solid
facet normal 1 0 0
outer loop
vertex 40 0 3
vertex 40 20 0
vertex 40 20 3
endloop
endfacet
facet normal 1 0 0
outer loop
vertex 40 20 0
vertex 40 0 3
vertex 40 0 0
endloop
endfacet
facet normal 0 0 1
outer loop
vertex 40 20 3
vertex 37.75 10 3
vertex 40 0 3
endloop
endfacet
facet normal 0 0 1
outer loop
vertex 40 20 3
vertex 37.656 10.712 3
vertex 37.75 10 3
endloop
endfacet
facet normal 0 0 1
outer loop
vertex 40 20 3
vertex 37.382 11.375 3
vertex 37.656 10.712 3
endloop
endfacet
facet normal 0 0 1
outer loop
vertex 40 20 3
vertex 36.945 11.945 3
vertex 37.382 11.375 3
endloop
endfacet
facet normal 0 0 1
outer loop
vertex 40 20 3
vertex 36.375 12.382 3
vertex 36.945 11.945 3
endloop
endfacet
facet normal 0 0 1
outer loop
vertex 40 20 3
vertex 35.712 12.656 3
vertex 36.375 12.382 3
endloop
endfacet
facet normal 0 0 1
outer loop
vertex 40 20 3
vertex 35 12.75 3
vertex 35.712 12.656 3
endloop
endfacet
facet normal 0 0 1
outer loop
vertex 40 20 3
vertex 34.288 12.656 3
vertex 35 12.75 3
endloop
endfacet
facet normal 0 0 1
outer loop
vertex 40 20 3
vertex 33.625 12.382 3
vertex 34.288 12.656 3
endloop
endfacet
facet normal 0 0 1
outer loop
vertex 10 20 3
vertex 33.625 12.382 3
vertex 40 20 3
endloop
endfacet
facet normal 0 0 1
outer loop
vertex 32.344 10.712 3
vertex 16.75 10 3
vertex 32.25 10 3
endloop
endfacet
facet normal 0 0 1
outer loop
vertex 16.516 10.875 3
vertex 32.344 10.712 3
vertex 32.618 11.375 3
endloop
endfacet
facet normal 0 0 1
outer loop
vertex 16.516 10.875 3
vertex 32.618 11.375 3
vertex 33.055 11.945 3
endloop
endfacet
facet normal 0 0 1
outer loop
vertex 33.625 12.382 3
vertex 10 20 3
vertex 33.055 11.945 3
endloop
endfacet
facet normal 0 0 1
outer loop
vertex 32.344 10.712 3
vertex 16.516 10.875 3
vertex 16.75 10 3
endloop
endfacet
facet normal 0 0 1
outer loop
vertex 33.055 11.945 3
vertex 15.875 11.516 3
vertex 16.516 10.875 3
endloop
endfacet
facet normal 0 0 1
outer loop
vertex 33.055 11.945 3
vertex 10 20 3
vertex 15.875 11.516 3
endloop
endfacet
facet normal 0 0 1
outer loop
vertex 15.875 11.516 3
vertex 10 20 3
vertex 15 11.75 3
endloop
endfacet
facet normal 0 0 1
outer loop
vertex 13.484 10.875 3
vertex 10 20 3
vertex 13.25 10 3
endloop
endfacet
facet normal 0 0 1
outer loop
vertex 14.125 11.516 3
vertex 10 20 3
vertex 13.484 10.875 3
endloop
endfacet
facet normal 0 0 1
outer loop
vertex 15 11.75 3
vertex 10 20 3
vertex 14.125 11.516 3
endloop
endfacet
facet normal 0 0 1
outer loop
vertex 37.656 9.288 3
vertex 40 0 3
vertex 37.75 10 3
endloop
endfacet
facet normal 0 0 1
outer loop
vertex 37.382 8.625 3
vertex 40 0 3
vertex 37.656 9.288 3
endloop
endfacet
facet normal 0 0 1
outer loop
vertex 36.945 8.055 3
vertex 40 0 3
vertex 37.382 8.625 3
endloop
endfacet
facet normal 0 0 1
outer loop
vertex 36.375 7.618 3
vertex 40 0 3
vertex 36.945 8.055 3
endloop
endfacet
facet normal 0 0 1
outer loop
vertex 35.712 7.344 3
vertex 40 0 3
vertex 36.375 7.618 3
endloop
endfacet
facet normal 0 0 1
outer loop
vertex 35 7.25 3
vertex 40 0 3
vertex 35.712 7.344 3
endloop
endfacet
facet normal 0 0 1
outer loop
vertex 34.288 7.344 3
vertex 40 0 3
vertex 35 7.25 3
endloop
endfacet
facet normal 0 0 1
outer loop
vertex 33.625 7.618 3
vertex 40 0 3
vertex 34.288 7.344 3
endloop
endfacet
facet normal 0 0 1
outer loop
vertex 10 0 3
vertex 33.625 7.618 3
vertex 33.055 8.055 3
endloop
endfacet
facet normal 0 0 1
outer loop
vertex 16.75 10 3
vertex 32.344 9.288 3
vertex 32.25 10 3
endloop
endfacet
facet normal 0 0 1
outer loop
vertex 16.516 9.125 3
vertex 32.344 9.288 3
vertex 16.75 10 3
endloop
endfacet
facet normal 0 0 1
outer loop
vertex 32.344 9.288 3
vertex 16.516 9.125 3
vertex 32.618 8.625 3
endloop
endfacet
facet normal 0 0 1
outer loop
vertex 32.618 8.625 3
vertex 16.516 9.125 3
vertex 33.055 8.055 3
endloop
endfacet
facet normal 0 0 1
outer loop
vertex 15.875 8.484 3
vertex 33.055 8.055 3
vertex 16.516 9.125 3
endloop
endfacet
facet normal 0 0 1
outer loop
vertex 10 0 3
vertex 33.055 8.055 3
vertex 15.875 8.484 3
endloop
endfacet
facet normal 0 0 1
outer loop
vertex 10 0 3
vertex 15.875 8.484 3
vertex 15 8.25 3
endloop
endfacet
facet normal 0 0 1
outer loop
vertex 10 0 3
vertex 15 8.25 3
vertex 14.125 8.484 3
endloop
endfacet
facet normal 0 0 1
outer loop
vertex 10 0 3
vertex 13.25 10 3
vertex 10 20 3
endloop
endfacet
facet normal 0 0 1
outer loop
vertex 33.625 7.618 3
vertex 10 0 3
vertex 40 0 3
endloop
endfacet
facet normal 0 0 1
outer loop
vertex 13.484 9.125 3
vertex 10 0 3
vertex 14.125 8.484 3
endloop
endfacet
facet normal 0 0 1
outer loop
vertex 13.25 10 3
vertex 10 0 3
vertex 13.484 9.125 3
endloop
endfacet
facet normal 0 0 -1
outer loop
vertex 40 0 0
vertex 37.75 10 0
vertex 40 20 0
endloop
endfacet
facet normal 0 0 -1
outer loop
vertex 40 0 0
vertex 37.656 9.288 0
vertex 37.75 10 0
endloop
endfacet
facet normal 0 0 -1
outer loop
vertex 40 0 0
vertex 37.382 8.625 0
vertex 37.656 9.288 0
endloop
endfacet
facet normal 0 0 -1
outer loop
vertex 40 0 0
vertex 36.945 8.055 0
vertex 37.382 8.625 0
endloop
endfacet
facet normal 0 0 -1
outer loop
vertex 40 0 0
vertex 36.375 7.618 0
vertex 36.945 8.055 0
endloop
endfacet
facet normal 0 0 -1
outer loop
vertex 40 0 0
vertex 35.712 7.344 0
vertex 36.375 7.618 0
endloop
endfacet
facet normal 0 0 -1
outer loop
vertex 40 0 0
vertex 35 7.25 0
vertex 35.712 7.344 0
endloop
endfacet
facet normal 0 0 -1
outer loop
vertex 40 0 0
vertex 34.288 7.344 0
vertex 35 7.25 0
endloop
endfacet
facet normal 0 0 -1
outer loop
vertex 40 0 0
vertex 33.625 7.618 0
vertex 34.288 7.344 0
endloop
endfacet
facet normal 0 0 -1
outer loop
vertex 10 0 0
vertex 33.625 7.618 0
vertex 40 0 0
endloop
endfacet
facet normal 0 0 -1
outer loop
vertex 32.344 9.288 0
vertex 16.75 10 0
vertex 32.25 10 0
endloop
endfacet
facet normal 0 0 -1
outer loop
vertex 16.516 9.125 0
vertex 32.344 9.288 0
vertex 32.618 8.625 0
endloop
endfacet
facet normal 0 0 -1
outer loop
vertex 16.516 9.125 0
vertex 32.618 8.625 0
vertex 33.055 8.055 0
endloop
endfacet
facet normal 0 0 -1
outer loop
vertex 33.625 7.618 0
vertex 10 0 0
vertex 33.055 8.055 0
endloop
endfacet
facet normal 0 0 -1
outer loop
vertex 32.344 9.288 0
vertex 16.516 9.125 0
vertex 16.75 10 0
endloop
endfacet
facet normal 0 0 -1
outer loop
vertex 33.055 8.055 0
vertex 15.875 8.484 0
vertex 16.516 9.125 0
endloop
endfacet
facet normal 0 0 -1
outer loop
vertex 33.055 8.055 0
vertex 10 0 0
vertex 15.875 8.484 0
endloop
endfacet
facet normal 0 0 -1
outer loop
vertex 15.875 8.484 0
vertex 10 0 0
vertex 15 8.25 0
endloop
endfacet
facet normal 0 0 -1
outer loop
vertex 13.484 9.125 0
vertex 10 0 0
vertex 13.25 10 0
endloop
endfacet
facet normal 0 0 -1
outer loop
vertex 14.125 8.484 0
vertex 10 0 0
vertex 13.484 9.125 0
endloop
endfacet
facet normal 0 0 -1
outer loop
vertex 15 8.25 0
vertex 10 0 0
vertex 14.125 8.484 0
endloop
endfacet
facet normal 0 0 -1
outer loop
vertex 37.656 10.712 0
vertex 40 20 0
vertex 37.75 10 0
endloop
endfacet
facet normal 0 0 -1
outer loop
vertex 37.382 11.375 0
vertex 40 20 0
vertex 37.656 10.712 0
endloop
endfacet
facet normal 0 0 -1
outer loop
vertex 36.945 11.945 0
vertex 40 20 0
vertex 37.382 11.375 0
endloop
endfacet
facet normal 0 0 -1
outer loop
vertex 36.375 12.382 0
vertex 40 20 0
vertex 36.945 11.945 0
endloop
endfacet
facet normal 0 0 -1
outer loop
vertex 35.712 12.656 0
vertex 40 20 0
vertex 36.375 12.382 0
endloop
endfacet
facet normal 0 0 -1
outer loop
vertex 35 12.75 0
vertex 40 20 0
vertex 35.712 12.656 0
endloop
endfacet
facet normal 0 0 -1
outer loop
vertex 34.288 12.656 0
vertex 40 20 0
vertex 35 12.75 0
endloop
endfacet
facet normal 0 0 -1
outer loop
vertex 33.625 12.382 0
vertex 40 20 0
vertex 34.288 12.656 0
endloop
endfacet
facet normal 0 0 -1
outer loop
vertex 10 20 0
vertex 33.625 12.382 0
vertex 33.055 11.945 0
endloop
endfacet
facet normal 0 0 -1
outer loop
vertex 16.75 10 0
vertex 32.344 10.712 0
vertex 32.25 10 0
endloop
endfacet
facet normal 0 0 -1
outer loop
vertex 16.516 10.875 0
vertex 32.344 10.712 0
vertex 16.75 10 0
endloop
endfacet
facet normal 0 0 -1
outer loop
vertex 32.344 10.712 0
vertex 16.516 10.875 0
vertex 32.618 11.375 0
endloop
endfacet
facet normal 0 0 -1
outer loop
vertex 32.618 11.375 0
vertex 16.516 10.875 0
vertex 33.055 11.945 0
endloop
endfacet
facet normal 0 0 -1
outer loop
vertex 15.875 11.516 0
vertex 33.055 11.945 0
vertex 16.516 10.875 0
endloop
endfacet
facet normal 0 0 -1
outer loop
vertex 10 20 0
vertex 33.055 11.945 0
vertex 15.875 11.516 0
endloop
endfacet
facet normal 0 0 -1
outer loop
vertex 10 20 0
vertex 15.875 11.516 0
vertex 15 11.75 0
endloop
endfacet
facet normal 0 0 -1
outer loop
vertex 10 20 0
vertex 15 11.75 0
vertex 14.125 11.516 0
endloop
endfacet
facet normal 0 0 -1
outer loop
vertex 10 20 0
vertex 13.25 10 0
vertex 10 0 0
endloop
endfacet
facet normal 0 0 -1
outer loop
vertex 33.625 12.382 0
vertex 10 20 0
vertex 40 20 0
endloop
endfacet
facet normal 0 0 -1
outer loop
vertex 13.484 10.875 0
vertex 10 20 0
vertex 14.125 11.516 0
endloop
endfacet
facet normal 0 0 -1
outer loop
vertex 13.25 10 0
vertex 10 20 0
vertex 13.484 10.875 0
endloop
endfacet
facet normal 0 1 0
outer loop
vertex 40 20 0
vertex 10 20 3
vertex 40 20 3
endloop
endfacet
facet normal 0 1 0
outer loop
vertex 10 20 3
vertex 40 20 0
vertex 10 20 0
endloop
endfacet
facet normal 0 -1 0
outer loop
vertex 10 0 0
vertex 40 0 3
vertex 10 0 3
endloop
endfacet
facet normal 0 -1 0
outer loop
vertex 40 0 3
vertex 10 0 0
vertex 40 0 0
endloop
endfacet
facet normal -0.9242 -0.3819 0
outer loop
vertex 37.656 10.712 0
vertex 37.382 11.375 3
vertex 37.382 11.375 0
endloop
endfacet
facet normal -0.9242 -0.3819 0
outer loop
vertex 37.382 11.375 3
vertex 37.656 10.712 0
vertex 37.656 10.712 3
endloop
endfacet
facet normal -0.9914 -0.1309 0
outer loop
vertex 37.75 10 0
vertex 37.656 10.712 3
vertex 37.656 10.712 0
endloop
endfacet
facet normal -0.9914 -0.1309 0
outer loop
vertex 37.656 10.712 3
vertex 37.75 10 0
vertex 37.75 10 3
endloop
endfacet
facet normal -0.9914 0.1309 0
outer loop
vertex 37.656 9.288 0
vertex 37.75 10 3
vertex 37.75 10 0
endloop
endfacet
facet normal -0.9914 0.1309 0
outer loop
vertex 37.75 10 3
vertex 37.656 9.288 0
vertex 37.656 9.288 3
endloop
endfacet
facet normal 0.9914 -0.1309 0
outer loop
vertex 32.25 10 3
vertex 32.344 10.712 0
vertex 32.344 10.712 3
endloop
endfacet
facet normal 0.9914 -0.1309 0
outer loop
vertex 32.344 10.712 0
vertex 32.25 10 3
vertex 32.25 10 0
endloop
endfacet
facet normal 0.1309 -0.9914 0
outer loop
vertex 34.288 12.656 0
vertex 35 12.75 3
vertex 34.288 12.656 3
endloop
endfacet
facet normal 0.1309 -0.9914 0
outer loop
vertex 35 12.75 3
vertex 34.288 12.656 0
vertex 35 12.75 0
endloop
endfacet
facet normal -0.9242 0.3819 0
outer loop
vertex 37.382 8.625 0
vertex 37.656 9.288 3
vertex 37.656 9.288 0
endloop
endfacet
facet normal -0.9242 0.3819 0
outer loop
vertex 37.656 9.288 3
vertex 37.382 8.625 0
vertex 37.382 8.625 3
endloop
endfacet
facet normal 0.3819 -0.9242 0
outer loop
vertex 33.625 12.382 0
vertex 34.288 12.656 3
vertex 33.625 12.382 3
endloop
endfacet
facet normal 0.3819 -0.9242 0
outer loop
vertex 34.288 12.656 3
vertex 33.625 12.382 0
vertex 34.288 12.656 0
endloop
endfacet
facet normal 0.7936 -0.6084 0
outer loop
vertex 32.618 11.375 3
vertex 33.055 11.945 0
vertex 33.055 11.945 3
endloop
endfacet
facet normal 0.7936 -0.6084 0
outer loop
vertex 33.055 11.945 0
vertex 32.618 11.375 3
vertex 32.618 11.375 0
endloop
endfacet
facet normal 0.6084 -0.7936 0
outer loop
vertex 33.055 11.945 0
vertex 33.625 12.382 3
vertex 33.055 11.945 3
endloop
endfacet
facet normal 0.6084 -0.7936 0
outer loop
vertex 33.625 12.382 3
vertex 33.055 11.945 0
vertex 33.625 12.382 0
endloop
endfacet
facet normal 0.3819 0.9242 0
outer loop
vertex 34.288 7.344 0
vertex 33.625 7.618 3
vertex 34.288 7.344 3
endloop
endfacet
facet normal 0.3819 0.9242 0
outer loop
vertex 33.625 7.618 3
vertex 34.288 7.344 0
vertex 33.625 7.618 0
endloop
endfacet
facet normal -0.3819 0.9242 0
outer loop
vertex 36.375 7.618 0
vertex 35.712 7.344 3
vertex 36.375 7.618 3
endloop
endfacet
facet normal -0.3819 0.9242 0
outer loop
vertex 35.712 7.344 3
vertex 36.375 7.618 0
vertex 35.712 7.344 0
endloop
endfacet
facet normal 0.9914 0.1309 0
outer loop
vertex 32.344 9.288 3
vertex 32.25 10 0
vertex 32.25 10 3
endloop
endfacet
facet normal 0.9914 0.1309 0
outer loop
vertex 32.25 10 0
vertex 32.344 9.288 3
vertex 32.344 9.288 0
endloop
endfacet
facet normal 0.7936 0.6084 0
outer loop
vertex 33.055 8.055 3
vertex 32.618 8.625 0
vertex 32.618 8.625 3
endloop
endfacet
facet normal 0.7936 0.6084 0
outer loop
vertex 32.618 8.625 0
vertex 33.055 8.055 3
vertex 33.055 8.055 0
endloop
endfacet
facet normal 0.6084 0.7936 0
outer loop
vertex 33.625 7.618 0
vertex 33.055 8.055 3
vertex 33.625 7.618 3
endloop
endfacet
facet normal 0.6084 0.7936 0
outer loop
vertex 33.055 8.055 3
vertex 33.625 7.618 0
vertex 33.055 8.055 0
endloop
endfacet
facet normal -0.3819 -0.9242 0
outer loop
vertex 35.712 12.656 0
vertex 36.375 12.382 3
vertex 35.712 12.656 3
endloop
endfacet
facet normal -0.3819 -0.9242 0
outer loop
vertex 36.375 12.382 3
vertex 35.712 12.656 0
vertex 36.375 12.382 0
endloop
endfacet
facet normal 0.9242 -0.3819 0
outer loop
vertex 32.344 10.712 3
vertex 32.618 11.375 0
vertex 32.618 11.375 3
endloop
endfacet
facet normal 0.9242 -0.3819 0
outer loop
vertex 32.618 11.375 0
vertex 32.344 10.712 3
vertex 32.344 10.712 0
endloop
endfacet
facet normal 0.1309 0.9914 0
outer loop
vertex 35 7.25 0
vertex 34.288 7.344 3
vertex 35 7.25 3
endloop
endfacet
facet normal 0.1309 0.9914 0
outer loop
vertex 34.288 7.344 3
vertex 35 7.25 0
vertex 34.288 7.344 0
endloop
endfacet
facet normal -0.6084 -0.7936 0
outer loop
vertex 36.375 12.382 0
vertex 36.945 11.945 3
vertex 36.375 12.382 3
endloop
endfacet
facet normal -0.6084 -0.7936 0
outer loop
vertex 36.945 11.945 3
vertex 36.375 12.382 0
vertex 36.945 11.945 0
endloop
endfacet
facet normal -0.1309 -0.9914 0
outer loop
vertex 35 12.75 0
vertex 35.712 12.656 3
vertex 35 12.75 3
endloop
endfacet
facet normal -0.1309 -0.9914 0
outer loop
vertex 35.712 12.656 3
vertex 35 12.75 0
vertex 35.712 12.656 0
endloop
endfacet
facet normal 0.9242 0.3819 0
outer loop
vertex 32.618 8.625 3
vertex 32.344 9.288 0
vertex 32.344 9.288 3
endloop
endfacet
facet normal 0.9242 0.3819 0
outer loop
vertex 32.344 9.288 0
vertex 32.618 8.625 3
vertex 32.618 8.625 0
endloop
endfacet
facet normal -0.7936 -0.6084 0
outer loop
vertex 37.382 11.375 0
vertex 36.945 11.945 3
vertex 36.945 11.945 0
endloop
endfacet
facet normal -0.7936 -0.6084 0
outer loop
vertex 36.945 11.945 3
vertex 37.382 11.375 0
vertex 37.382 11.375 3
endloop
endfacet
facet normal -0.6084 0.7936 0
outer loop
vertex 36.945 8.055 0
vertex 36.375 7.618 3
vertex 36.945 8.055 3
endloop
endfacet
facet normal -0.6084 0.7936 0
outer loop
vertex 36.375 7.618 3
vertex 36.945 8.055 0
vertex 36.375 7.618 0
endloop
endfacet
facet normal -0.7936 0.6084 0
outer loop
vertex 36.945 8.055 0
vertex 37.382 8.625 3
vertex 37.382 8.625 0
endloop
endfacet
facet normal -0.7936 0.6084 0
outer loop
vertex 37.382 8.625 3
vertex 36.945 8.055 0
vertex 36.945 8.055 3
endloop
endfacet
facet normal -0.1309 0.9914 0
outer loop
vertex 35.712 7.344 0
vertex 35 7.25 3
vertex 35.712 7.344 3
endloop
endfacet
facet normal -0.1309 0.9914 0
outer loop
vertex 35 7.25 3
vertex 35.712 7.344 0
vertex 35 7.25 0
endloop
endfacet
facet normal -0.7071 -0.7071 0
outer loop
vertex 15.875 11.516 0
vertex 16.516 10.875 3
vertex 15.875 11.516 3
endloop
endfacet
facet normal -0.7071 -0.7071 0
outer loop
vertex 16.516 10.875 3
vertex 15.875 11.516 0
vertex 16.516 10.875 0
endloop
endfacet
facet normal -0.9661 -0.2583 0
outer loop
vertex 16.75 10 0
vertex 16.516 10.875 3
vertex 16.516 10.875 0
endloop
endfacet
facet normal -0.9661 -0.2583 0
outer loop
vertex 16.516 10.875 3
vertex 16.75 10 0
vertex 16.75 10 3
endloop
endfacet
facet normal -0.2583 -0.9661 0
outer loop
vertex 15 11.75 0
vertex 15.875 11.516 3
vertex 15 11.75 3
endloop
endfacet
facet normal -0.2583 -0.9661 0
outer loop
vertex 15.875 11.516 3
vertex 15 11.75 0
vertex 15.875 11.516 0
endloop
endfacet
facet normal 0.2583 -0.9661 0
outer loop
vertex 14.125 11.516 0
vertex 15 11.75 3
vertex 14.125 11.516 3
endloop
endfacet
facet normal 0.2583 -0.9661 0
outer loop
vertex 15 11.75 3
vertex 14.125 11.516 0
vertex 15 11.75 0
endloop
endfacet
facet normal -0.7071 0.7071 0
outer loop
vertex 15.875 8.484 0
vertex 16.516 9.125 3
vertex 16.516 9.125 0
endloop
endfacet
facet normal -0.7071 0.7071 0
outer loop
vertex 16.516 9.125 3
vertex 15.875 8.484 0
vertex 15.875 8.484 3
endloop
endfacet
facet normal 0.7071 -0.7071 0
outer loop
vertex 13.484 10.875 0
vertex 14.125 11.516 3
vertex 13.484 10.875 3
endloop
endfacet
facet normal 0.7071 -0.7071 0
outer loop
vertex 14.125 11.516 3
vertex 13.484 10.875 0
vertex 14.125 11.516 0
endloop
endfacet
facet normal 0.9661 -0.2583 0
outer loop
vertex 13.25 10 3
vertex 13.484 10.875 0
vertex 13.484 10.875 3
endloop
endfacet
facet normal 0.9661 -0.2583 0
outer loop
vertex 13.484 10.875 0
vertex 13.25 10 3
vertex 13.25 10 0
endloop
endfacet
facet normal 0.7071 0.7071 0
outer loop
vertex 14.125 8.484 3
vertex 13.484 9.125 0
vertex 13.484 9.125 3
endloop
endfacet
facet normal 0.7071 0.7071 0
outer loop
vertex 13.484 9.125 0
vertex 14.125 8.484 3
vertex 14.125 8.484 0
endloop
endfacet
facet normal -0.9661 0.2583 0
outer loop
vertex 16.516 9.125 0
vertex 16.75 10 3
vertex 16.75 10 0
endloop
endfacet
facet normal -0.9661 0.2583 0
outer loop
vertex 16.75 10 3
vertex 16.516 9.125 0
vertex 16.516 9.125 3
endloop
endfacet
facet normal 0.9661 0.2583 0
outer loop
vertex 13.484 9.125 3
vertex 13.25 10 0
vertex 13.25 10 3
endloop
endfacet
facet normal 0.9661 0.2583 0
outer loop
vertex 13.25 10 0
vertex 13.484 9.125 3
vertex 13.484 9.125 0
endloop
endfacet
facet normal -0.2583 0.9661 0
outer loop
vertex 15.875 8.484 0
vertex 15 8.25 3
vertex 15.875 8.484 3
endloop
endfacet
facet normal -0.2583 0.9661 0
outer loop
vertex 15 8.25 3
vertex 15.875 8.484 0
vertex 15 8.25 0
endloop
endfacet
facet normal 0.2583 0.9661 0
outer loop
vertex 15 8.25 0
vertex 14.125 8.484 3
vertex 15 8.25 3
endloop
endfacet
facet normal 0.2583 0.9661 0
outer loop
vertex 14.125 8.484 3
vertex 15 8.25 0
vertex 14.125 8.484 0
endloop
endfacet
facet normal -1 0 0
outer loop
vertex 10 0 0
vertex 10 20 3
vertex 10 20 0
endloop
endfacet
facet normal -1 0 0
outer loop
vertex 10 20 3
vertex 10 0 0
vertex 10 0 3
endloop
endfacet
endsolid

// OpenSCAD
difference()
{
    union()
    {
        cube([40,20,3]);
        
        translate([-2.5,0,0])
            cube([2.5,20,3]);
        
        //translate([-2.5,0,0])
        //    cube([20+2.5,20,20+3]);
    }
    union()
    {
        translate([35,10,0])
            cylinder(d=5.5,h=3,$fn=24);
        
        translate([2.5,5,0])
            cylinder(d=2.5,h=30,$fn=12);
        translate([2.5,15,0])
            cylinder(d=2.5,h=30,$fn=12);
        
        translate([15,10,0])
            cylinder(d=3.5,h=30,$fn=12);
        
        
        translate([-2.5,0,0])
            cube([2.5+10,20,30]);
    }
}
